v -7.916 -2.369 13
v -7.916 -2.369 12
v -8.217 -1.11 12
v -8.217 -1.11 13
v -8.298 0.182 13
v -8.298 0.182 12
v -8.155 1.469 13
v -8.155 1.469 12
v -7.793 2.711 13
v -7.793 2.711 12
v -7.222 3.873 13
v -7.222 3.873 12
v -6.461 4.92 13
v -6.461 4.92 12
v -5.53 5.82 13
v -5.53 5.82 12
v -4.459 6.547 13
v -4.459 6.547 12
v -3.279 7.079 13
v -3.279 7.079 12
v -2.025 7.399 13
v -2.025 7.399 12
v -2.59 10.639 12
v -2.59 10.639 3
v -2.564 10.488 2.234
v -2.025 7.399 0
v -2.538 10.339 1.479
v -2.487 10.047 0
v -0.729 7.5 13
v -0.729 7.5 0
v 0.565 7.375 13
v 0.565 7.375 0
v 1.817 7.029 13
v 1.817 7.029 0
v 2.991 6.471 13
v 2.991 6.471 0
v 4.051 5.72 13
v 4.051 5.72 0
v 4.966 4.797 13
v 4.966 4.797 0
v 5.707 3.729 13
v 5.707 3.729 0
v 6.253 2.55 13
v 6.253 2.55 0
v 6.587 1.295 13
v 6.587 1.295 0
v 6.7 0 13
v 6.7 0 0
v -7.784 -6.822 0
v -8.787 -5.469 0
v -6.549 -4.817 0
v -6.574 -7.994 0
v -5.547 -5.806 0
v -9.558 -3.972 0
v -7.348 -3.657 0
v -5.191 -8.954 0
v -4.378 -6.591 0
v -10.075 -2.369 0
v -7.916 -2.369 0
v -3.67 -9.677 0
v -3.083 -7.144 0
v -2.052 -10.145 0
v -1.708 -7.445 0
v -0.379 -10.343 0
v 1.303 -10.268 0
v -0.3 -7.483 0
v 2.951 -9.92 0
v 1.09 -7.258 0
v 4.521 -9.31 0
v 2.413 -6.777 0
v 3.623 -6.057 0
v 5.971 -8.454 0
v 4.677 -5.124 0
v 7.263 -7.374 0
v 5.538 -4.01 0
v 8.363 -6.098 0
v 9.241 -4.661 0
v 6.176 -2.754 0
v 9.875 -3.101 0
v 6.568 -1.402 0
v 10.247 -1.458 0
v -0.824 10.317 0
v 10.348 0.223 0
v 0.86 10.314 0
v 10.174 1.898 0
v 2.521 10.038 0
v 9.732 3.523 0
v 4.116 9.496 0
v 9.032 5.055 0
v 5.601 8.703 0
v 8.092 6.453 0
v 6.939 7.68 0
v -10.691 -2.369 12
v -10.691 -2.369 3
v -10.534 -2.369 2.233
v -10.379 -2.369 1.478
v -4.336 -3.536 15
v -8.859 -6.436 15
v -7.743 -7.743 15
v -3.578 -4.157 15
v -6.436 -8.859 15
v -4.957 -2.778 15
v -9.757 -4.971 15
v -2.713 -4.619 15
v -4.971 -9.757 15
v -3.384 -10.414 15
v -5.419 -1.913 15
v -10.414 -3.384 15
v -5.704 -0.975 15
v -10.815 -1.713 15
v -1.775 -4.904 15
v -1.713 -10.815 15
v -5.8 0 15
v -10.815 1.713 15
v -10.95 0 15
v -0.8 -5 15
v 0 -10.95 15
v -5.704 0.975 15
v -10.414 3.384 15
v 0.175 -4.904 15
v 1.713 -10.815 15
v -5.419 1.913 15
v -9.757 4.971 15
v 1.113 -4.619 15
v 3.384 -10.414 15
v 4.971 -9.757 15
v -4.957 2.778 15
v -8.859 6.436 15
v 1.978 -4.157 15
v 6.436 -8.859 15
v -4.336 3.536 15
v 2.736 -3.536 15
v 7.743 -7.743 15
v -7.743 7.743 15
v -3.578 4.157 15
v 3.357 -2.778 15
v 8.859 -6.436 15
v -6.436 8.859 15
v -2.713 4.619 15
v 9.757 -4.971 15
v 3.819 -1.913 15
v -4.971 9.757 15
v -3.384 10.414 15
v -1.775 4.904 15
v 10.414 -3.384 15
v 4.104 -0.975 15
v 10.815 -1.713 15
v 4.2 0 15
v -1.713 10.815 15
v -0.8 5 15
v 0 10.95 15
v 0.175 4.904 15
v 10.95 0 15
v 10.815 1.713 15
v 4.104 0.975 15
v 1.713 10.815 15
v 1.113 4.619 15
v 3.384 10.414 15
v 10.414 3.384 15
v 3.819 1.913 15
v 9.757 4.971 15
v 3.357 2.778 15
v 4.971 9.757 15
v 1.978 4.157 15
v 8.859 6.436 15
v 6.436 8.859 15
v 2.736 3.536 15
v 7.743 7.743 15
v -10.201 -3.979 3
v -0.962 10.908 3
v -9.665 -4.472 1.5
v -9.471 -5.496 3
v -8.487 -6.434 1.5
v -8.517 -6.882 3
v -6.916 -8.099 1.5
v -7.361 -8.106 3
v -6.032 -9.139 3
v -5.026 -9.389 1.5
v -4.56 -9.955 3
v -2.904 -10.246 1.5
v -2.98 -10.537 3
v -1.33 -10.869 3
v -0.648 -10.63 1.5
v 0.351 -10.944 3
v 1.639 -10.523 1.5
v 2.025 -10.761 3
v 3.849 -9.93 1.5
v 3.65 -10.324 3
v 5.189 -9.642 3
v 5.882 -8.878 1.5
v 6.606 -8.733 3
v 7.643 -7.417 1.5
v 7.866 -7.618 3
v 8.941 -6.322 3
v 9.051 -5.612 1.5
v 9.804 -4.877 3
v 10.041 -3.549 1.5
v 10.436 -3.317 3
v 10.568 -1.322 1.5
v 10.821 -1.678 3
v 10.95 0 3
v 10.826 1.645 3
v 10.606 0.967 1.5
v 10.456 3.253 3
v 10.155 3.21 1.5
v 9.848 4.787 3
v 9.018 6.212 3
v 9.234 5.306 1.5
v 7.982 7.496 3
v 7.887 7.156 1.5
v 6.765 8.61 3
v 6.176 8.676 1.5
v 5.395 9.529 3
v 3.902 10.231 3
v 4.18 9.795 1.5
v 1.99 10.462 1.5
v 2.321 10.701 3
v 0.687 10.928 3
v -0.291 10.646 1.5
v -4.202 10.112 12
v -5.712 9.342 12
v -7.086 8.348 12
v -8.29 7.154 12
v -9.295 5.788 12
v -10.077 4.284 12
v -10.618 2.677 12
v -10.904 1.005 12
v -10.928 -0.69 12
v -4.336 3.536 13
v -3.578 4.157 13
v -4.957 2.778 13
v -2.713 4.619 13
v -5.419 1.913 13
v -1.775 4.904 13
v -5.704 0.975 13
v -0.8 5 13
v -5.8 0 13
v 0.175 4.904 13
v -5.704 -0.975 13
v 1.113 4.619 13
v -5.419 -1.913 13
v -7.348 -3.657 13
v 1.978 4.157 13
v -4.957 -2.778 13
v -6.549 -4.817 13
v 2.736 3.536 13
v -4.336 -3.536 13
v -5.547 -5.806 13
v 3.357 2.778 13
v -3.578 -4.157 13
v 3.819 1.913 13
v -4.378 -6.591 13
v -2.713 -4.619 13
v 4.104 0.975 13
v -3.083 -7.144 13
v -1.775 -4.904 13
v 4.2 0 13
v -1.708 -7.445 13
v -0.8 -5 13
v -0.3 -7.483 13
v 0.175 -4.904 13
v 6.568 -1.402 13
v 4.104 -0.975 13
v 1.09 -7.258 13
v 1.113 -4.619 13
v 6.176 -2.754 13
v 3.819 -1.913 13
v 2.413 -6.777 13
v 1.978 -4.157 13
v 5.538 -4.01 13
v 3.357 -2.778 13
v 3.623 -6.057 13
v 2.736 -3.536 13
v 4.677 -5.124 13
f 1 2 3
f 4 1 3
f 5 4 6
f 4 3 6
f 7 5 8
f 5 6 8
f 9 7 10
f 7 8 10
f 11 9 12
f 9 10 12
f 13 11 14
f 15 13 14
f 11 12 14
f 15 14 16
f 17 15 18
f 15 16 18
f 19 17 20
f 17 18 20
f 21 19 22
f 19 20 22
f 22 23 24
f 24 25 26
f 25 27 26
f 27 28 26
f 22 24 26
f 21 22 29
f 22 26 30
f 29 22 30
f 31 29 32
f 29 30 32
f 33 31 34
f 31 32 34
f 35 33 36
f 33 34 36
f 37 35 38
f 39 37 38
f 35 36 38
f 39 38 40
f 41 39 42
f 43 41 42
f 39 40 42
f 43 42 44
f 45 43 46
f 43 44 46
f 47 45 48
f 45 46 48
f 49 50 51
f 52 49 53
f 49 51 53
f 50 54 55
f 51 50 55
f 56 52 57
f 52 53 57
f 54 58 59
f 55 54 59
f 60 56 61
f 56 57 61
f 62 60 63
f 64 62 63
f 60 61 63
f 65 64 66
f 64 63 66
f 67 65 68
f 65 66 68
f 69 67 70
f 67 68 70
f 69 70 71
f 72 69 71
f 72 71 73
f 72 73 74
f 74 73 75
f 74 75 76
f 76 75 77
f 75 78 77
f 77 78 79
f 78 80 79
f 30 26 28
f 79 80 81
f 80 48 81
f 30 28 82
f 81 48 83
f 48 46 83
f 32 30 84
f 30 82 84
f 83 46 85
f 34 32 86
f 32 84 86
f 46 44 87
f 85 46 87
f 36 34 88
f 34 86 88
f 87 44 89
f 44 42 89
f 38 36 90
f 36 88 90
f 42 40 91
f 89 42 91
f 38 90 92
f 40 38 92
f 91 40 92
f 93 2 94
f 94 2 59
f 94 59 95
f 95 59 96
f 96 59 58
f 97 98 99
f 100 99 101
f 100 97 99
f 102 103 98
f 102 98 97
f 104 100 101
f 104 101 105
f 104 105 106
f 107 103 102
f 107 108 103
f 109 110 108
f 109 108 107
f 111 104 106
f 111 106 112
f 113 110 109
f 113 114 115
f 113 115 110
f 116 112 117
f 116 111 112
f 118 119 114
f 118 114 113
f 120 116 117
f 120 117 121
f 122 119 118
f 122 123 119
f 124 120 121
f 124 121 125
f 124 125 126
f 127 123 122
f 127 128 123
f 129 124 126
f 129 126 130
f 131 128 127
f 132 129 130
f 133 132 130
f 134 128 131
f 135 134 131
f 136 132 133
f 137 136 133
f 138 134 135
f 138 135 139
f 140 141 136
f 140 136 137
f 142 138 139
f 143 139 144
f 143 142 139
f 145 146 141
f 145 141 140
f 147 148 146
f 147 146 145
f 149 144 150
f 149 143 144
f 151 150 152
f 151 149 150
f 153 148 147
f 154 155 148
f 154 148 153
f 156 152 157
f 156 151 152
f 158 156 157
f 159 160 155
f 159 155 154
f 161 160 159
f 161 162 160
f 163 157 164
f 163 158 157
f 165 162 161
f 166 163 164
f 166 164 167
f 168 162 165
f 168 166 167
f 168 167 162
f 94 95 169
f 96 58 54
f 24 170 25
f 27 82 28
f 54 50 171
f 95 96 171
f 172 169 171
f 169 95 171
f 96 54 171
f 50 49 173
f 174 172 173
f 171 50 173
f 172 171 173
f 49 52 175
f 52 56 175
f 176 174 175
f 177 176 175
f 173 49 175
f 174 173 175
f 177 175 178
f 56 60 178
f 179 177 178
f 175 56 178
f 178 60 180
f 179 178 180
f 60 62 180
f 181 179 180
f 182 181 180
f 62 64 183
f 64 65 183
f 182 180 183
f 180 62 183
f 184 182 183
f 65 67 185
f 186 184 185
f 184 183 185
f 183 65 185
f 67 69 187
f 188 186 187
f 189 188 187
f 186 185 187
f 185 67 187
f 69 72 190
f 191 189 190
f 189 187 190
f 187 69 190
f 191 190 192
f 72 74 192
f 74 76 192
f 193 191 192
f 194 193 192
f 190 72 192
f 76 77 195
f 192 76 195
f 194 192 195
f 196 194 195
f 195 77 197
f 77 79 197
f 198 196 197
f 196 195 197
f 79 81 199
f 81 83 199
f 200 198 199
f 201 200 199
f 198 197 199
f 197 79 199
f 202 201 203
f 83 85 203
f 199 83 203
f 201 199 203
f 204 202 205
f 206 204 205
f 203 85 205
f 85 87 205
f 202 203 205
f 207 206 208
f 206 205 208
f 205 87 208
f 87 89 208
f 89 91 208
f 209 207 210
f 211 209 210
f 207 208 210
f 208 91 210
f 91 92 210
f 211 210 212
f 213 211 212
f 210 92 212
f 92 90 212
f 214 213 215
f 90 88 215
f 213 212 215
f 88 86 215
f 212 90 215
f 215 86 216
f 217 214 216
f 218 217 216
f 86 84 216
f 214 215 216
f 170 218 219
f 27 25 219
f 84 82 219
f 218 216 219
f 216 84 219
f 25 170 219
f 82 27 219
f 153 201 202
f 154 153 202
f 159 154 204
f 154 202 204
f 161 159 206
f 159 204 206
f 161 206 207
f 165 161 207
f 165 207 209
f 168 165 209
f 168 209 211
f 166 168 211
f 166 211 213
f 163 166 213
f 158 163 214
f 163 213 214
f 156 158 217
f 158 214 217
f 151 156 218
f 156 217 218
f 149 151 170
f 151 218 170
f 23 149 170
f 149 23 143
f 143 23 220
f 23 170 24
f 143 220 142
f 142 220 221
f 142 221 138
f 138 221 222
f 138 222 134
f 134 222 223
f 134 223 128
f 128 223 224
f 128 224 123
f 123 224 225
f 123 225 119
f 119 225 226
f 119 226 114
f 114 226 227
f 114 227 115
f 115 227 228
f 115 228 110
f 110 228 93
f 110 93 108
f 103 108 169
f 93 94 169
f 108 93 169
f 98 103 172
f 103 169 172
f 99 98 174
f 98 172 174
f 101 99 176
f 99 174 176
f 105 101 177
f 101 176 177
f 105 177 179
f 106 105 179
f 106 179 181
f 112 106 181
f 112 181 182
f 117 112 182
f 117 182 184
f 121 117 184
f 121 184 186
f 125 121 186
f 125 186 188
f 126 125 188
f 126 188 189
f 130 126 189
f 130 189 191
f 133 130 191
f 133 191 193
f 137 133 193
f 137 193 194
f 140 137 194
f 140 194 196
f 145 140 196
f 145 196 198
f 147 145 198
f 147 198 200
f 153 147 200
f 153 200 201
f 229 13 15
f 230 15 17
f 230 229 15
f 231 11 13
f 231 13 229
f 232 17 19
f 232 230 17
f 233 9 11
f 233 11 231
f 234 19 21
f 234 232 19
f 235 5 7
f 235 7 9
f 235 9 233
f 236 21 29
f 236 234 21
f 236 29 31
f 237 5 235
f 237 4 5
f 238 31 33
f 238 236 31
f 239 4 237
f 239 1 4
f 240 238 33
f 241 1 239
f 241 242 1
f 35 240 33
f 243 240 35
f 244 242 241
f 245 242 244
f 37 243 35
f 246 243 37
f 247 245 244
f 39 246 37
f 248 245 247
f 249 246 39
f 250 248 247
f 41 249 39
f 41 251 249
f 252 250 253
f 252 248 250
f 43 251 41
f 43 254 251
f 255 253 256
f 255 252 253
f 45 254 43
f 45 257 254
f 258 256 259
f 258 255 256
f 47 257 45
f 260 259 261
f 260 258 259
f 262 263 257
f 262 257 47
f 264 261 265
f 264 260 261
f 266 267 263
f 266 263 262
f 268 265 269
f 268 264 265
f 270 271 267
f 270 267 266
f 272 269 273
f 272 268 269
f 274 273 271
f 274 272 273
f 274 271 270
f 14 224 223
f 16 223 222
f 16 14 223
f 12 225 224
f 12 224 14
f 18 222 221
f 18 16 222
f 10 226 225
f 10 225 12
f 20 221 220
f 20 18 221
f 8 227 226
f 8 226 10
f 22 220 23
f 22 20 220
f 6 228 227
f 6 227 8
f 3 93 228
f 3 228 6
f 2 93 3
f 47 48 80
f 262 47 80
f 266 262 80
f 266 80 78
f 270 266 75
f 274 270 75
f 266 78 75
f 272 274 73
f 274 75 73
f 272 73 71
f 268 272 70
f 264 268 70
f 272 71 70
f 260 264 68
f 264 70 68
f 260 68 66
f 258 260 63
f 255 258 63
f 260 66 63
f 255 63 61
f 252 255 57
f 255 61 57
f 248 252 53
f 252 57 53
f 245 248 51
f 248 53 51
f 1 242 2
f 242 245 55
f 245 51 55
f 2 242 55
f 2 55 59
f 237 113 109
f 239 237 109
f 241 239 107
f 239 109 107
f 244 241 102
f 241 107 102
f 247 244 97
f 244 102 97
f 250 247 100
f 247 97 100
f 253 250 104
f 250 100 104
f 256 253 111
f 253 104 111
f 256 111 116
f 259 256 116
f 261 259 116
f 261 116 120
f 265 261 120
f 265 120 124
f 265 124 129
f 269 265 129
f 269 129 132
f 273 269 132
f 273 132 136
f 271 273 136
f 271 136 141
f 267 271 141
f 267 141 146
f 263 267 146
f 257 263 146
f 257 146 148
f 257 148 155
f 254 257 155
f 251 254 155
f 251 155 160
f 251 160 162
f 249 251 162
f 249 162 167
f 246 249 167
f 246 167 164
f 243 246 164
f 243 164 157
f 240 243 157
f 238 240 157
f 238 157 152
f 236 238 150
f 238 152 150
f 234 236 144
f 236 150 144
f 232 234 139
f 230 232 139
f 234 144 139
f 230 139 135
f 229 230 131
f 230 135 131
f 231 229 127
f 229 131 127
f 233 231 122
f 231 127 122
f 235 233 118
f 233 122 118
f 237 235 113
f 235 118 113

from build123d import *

# Parameters (mm, degrees)
F0_R     = 10.95
F1_DEPTH = 15
F3_DEPTH = 12
F4_DEPTH = 13
F6_D     = 10
F6_DEPTH = 10
F7_SIZE2 = 0.6
F7_SIZE  = 3


with BuildPart() as f1:
    # F0 (on Top) → F1 (new body)
    with BuildSketch(Plane.XY):
        Circle(F0_R)
    extrude(amount=F1_DEPTH)

    # F2 (on face) → F3 (cut)
    with BuildSketch(Plane(origin=(0, 0, 0), x_dir=(1, 0, 0), z_dir=(0, 0, -1))):
        with BuildLine():
            ThreePointArc((-2.024549, -7.399357), (-7.222314, -3.873485), (-7.916064, 2.368889))
            Line((-7.916064, 2.368889), (-10.690691, 2.368889))
            ThreePointArc((-10.690691, 2.368889), (-9.295049, -5.788313), (-2.590118, -10.639257))
            Line((-2.590118, -10.639257), (-2.024549, -7.399357))
        make_face()
    extrude(amount=-F3_DEPTH, mode=Mode.SUBTRACT)

    # F2 (on face) → F4 (cut)
    with BuildSketch(Plane(origin=(0, 0, 0), x_dir=(1, 0, 0), z_dir=(0, 0, -1))):
        with BuildLine():
            ThreePointArc((-2.024549, -7.399357), (4.051076, -5.719883), (6.7, 0))
            ThreePointArc((6.7, 0), (0.3999, 7.403394), (-7.916064, 2.368889))
            ThreePointArc((-7.916064, 2.368889), (-7.222314, -3.873485), (-2.024549, -7.399357))
        make_face()
    extrude(amount=-F4_DEPTH, mode=Mode.SUBTRACT)

    # F6
    with Locations(Plane(origin=(0, 0, 13), x_dir=(1, 0, 0), z_dir=(0, 0, -1))):
        with Locations((-0.8, 0)):
            Hole(F6_D / 2, depth=F6_DEPTH)

    # F7
    f7_edges = [f1.edges().sort_by_distance(p)[0] for p in [
        (6.765379, 8.610003, 0),
        (1.19152, -10.88498, 0),
    ]]
    chamfer(f7_edges, length=F7_SIZE, length2=F7_SIZE2)


solid = f1.part
